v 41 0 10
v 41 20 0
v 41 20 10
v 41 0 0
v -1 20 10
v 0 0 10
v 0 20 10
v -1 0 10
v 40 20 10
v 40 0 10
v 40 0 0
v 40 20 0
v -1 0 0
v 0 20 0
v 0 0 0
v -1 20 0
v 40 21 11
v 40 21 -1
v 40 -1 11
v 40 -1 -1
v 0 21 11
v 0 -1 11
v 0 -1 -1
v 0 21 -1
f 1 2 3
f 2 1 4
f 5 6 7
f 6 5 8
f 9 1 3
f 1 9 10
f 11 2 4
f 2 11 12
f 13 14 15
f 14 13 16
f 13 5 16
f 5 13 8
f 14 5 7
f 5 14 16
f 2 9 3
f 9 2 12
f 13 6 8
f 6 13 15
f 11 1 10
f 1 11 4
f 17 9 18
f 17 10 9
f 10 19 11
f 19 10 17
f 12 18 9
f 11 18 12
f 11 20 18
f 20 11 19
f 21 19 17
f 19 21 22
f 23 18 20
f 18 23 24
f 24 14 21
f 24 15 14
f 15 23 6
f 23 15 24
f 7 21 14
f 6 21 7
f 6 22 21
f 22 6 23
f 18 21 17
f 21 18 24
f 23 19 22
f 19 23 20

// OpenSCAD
// Unit of length: Unit.MM
union()
{
   color(c = [1.0, 0.0, 0.0, 1.0])
   {
      translate(v = [-1.0, 0.0, 0.0])
      {
         cube(size = [42.0, 20.0, 10.0], center = false);
      }
   }
   translate(v = [0.0, -1.0, -1.0])
   {
      cube(size = [40.0, 22.0, 12.0], center = false);
   }
}
